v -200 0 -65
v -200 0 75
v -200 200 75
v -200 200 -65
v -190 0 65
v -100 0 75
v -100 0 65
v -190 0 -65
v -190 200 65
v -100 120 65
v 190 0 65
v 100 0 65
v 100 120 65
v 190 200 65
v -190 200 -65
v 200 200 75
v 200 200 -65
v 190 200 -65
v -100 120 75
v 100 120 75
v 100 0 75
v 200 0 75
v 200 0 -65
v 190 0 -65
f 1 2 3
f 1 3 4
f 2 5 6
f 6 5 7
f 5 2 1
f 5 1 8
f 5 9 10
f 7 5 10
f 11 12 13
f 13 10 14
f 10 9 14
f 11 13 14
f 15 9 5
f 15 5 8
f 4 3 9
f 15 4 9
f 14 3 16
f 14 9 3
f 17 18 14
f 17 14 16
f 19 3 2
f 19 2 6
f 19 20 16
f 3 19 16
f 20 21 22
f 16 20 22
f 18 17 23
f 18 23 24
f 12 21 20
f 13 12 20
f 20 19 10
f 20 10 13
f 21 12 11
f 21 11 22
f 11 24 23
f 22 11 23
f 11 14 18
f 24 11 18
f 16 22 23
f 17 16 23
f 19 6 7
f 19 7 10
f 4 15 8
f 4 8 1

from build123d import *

# Parameters (mm, degrees)
SKETCH1_W           = 400
SKETCH1_H           = 150
BOSS_EXTRUDE1_DEPTH = 200
SKETCH2_W           = 380
SKETCH2_H           = 130
CUT_EXTRUDE1_DEPTH  = 200
SKETCH3_W           = 200
SKETCH3_H           = 120
CUT_EXTRUDE2_DEPTH  = 20
SKETCH4_W           = 400
SKETCH4_H           = 200
CUT_EXTRUDE3_DEPTH  = 10


with BuildPart() as part:
    # Sketch1 → Boss-Extrude1 (new body)
    with BuildSketch(Plane(origin=(0, 0, 0), x_dir=(1, 0, 0), z_dir=(0, 1, 0))):
        Rectangle(SKETCH1_W, SKETCH1_H)
    extrude(amount=BOSS_EXTRUDE1_DEPTH)

    # Sketch2 → Cut-Extrude1 (cut)
    with BuildSketch(Plane(origin=(0, 200, 0), x_dir=(1, 0, 0), z_dir=(0, 1, 0))):
        Rectangle(SKETCH2_W, SKETCH2_H)
    extrude(amount=-CUT_EXTRUDE1_DEPTH, mode=Mode.SUBTRACT)

    # Sketch3 → Cut-Extrude2 (cut)
    with BuildSketch(Plane.XY.offset(75)):
        with Locations((0, 60)):
            Rectangle(SKETCH3_W, SKETCH3_H)
    extrude(amount=-CUT_EXTRUDE2_DEPTH, mode=Mode.SUBTRACT)

    # Sketch4 → Cut-Extrude3 (cut)
    with BuildSketch(Plane(origin=(0, 0, -75), x_dir=(-1, 0, 0), z_dir=(0, 0, -1))):
        with Locations((0, 100)):
            Rectangle(SKETCH4_W, SKETCH4_H)
    extrude(amount=-CUT_EXTRUDE3_DEPTH, mode=Mode.SUBTRACT)


solid = part.part
